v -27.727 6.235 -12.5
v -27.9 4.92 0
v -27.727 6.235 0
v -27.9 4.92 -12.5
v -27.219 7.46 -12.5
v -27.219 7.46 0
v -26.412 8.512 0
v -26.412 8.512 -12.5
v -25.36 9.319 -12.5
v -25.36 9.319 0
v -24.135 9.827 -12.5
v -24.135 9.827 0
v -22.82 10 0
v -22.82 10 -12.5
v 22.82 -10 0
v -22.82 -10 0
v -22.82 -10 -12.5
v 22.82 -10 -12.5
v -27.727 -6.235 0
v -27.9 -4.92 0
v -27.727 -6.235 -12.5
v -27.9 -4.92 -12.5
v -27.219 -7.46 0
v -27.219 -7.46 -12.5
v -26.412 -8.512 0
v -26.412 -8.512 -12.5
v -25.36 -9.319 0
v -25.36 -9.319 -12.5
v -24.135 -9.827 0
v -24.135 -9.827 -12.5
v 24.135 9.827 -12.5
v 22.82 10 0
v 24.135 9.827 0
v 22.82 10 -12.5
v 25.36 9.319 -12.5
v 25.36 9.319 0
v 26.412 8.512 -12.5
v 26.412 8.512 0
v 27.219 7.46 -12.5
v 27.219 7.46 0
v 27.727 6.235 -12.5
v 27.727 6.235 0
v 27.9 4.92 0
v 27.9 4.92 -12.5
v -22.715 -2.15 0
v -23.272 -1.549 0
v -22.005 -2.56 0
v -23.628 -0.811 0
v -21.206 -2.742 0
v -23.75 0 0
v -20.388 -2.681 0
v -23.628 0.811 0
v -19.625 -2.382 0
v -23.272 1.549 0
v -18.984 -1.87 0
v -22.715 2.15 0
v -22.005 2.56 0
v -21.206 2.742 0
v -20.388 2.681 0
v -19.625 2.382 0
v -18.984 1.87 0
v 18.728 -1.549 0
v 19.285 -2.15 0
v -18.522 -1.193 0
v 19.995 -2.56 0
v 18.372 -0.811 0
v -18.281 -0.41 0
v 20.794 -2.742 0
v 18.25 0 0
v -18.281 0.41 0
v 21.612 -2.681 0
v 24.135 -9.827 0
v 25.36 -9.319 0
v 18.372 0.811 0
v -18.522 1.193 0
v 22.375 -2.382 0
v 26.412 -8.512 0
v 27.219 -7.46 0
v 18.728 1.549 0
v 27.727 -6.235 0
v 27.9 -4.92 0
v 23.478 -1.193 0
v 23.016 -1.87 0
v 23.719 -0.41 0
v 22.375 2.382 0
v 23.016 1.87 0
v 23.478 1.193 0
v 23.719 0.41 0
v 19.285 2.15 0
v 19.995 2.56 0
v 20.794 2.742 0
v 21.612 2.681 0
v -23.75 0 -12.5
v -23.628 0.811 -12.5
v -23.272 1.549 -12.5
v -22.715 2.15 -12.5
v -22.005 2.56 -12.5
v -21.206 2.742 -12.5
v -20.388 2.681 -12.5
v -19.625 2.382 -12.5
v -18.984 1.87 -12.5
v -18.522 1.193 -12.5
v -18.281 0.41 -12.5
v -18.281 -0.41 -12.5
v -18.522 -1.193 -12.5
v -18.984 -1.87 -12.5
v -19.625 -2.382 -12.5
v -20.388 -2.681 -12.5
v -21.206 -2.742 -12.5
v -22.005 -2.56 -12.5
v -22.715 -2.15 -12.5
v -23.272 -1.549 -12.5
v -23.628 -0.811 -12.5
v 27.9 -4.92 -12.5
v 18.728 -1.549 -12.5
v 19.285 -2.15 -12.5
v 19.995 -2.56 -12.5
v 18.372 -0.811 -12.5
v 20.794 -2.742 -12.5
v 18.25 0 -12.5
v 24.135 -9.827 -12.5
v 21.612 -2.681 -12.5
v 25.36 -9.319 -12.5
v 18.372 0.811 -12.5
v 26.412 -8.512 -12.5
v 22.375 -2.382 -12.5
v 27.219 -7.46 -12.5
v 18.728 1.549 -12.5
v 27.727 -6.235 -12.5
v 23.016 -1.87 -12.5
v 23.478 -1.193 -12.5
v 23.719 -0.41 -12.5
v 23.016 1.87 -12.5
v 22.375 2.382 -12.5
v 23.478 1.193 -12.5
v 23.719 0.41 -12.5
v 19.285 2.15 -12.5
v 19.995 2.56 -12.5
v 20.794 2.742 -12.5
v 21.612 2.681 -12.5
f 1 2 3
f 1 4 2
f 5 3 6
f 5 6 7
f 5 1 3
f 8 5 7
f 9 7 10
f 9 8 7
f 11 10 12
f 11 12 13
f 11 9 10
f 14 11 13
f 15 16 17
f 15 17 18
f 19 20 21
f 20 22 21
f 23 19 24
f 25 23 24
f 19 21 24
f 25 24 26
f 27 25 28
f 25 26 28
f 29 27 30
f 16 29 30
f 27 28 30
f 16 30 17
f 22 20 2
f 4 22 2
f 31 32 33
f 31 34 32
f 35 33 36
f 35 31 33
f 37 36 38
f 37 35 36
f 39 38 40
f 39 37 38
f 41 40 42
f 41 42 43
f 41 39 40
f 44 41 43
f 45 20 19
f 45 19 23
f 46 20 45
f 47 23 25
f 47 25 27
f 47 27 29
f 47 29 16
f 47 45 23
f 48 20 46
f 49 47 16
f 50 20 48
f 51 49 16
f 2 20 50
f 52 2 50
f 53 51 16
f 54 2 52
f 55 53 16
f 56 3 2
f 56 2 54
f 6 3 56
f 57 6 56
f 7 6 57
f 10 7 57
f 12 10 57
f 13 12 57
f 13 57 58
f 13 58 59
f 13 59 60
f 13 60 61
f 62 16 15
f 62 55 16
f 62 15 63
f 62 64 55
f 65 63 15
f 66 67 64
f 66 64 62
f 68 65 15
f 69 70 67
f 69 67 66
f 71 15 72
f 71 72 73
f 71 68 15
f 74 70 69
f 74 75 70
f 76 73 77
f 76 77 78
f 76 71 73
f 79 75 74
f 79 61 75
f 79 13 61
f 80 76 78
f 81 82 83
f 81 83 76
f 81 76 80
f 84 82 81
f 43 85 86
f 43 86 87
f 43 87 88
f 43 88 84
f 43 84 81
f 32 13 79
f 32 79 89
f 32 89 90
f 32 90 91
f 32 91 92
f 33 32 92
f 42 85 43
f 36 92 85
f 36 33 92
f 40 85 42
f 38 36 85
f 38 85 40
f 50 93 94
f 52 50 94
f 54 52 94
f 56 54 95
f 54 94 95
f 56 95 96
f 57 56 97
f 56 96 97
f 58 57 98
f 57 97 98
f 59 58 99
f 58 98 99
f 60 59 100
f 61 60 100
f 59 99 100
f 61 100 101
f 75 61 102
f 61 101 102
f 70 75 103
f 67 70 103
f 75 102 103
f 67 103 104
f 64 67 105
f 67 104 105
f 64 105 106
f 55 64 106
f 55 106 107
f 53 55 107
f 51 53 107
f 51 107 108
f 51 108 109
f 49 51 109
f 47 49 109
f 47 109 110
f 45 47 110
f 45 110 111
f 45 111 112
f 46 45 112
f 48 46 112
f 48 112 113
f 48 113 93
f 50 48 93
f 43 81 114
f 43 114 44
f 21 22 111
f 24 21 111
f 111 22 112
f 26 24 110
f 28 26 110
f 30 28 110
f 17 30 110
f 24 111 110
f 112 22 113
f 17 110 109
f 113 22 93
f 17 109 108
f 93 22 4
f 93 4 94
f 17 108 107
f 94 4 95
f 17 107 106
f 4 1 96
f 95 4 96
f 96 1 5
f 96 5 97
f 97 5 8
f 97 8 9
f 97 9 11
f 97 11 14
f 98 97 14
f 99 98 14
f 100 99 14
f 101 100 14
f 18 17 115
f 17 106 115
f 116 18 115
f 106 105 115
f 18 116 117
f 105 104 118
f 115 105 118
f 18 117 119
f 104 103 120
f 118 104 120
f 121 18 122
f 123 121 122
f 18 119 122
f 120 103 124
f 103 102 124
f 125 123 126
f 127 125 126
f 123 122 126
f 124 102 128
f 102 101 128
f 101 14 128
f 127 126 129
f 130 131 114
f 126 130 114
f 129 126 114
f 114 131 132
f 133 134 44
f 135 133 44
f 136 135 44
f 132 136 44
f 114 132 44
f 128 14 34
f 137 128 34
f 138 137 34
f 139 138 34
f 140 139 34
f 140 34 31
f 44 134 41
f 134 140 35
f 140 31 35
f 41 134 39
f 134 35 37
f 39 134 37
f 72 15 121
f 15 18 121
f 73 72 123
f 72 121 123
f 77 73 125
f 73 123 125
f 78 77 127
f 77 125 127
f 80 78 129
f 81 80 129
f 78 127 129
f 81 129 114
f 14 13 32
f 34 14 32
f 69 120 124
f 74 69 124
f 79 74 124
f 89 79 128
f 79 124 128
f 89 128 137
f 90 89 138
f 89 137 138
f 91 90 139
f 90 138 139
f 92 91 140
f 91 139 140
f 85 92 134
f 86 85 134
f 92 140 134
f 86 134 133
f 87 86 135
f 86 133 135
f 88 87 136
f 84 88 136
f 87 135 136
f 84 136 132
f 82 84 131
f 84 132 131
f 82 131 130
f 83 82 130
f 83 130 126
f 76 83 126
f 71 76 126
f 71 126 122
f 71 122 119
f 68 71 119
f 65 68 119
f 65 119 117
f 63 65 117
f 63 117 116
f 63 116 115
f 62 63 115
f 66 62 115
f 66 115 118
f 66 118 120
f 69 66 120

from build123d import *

# Parameters (mm, degrees)
F0_W     = 55.8
F0_H     = 20
F1_DEPTH = 12.5
F2_D     = 5.5
F3_R     = 5.08


with BuildPart() as f1:
    # F0 (on Top) → F1 (new body)
    with BuildSketch(Plane.XY):
        Rectangle(F0_W, F0_H)
    extrude(amount=-F1_DEPTH)

    # F2 (through all)
    with Locations(Plane.XY):
        with Locations((21, 0), (-21, 0)):
            Hole(F2_D / 2)

    # F3
    f3_edges = [f1.edges().sort_by_distance(p)[0] for p in [
        (27.9, 10, -6.25),
        (27.9, -10, -6.25),
        (-27.9, -10, -6.25),
        (-27.9, 10, -6.25),
    ]]
    fillet(f3_edges, radius=F3_R)


solid = f1.part
